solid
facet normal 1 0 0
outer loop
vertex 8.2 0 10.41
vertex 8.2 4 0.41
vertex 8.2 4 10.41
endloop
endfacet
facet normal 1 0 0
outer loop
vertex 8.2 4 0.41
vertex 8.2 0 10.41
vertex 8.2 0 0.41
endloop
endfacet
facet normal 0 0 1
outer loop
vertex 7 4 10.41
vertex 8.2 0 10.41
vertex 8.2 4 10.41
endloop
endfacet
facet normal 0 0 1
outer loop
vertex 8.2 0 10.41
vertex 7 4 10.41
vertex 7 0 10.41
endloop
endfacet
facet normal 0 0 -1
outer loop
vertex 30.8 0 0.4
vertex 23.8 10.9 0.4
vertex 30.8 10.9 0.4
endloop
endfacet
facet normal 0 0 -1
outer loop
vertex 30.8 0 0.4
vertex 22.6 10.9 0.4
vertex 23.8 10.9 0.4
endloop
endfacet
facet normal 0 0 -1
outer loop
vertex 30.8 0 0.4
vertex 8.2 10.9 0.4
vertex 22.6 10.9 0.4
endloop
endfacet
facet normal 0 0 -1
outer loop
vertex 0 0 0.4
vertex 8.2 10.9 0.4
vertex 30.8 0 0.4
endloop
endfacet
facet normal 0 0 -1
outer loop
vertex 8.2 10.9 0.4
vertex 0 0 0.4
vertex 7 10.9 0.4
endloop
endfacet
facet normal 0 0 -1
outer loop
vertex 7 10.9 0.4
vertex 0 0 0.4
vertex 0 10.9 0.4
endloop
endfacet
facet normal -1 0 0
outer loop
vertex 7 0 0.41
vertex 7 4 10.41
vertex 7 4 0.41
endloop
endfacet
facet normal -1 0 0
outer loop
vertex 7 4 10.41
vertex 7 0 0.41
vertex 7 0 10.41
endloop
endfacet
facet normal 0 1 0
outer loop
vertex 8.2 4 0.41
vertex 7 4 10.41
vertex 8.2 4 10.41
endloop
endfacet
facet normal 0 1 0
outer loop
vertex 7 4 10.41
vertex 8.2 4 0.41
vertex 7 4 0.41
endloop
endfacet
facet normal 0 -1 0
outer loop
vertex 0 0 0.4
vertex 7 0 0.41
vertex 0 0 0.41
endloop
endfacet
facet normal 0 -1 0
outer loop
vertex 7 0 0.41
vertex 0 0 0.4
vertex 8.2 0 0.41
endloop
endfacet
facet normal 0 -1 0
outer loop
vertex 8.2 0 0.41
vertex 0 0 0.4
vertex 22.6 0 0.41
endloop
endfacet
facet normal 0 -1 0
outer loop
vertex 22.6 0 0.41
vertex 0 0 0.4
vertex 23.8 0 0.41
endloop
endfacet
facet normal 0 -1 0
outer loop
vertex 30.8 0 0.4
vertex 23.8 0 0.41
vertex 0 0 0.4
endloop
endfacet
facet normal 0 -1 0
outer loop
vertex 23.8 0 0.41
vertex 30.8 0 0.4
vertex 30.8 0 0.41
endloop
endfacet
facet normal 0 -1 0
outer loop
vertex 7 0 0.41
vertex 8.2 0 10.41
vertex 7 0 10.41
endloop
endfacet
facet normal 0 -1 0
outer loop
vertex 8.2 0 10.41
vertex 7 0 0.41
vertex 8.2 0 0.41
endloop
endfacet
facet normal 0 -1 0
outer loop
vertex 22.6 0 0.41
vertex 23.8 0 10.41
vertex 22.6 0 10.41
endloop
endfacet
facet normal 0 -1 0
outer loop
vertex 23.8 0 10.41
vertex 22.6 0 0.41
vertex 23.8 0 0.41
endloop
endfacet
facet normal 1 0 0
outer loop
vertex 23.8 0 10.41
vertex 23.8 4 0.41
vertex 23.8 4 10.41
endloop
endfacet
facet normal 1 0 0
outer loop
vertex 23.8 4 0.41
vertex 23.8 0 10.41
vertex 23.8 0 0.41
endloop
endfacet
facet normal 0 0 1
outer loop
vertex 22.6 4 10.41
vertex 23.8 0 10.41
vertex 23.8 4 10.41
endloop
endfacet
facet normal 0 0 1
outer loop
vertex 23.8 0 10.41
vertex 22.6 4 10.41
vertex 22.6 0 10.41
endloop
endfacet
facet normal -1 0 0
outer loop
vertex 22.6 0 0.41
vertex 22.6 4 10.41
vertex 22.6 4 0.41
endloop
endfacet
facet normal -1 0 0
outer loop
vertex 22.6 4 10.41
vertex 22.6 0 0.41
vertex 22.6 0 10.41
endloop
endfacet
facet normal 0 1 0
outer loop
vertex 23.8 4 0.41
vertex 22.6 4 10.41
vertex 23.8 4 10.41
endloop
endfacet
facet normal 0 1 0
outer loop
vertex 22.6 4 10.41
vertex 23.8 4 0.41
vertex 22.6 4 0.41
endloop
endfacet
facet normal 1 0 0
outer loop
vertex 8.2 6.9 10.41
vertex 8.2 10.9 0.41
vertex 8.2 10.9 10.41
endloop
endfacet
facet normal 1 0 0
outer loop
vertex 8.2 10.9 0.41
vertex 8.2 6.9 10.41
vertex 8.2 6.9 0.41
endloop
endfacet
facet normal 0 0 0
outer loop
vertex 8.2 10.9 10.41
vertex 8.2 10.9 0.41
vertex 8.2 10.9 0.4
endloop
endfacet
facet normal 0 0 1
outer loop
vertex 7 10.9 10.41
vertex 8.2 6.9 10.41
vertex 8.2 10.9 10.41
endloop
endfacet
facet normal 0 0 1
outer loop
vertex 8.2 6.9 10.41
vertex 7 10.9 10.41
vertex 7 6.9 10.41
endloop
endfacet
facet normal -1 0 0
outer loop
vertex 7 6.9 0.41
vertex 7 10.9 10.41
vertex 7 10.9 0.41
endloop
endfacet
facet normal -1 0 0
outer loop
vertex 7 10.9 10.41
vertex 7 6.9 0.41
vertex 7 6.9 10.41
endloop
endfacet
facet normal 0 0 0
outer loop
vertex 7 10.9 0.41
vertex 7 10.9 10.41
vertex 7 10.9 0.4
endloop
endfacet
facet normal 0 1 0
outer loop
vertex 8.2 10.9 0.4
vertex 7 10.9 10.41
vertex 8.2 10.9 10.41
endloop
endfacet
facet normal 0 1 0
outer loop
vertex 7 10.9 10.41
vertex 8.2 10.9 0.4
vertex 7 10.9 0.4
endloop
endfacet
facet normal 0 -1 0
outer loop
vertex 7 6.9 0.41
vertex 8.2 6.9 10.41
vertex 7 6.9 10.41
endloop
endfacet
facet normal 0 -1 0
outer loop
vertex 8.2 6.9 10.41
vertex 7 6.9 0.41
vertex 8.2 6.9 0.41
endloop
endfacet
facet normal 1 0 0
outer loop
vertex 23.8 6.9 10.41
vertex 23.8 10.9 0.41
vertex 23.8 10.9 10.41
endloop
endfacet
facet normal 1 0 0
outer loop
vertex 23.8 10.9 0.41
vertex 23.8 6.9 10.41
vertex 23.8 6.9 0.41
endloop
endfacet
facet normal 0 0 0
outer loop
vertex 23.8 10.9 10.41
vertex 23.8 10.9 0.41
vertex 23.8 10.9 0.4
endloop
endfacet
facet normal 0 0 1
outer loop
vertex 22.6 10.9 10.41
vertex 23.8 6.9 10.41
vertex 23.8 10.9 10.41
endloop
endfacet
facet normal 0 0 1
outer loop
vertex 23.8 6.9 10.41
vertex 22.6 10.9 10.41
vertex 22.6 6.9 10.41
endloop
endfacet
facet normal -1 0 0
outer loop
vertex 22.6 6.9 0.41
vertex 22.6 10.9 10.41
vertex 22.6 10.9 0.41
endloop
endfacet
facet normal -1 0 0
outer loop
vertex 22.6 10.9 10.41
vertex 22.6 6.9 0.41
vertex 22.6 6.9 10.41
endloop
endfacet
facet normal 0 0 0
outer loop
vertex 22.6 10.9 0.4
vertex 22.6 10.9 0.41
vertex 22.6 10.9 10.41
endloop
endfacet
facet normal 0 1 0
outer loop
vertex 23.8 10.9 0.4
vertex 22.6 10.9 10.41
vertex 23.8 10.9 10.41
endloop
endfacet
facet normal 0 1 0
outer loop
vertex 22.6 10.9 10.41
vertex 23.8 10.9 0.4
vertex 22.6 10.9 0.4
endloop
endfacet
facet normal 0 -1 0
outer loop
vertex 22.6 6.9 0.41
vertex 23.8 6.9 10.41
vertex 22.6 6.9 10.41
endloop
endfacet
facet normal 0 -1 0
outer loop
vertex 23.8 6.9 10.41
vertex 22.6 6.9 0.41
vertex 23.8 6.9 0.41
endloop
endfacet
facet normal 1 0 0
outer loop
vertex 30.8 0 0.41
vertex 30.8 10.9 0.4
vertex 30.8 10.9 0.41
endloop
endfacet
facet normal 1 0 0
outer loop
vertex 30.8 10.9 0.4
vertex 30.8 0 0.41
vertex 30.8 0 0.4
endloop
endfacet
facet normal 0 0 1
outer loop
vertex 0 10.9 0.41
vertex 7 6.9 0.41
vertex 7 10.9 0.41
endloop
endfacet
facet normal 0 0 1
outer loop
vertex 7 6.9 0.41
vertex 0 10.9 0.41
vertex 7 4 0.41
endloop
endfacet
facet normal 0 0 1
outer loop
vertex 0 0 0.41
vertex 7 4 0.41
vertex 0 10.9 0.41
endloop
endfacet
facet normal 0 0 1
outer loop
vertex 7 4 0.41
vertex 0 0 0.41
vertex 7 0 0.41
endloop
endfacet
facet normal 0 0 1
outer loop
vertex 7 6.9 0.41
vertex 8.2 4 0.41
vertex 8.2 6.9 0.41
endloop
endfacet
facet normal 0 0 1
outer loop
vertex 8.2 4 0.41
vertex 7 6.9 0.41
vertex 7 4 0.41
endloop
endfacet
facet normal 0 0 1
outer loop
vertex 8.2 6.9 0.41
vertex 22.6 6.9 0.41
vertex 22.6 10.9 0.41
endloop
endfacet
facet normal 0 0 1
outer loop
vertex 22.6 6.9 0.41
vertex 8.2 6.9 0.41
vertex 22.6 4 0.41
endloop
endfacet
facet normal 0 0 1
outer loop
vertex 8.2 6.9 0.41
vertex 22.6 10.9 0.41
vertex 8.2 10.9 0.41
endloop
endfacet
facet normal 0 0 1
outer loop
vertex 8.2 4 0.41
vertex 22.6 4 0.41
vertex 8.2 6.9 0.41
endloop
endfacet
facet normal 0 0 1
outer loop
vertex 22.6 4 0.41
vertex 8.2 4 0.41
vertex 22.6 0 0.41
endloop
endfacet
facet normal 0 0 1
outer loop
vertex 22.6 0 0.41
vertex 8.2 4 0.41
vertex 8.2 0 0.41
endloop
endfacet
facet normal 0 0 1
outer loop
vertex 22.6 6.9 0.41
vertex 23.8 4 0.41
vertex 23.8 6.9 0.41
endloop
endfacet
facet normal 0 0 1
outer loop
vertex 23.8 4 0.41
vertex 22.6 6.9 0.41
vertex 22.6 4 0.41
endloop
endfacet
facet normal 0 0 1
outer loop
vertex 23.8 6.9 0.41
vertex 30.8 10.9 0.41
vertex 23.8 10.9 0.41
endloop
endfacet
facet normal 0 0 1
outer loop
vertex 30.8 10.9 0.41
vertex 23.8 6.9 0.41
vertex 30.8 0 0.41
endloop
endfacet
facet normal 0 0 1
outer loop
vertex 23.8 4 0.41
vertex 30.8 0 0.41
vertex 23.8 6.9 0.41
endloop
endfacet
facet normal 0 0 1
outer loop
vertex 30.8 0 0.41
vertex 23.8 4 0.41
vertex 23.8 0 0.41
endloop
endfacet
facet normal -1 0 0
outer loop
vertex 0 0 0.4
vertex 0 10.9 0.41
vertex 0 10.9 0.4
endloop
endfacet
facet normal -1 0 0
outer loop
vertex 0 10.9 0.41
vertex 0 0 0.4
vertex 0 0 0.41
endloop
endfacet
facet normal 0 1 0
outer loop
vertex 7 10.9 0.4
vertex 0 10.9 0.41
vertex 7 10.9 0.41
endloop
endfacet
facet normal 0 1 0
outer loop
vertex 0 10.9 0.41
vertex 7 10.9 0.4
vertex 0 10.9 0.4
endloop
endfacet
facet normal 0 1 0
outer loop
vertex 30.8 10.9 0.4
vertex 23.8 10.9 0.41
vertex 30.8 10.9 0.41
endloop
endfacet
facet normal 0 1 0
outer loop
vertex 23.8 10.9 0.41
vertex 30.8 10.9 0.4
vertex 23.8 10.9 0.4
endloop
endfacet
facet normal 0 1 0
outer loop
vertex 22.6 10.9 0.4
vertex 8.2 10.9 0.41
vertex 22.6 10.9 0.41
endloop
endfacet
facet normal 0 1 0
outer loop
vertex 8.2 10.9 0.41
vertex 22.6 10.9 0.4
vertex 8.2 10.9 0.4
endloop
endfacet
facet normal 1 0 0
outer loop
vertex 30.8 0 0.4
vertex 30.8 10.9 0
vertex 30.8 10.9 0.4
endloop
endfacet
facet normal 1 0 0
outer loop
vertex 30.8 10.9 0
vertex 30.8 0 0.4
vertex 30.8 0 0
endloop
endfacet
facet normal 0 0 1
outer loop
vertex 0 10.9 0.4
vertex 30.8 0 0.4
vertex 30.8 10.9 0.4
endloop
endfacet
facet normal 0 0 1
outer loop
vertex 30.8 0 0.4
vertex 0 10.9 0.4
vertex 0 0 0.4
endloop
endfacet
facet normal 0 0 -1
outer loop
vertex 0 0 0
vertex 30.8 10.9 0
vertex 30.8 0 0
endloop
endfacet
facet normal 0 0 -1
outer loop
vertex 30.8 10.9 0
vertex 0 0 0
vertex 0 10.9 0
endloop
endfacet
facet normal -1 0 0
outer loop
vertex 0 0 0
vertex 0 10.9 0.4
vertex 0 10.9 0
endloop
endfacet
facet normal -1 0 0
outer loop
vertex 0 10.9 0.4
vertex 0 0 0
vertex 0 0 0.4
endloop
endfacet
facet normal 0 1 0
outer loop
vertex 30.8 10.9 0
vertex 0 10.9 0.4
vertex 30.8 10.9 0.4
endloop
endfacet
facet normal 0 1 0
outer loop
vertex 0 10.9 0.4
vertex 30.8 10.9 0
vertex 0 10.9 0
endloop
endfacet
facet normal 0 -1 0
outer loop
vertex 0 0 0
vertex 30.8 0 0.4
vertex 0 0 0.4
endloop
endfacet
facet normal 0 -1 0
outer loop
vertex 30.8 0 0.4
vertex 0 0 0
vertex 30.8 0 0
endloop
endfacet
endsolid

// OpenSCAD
// file: ../../Base/Boxes.scad
// Fischertechnik Box Foundation
// Pre-designed Boxes

use <Constants.scad>

include <PlacementOptions.scad>

box190Width = 190;
box190Depth = 130;
box130Width = 130;
box130Depth = 95;
boxUsageHeight = 33.9;
boxWallThickness = 2.4;
boxBaseThickness = 1.0;
boxWebWidth = 3.0;

// getBoxWallThickness()
// Gets the wall thickness of a Fischertechnik Box

function getBoxWallThickness() = boxWallThickness;

// Gets the usable height of a fischertechnik box
function getBoxUsageHeight() = boxUsageHeight;

// Gets the thickness of the Fischertechnik box base.
function getBoxBaseThickness() = boxBaseThickness;

// Gets the width of a box web
function getBoxWebWidth() = boxWebWidth;

// Gets the usable inner space of a Box 190 as an x/y-list
function getBox190Space() = [
    box190Width - 2*getBoxWallThickness(), 
    box190Depth - 2*getBoxWallThickness() ];

// Imports the Fischertechnik empty box 130x190 mm and places it at position 0,0
// 190x130 are the outer sizes, the inner space is slightly smaller. Use getBox190Space() to get the inner sizes.
// This module needs the STL file "Fischertechnik Box 130x190.stl" in the library path.
// The box is positioned that the usable inner space is at the 0,0,0 position. The

module Box190() {
    translate([-getBoxWallThickness(),-getBoxWallThickness(),-getBoxBaseThickness()])
        import("Fischertechnik Box 130x190.stl", convexity=3);
}

// Gets the usable inner space of a Box 130 as an x/y-list
function getBox130Space() = [
    box130Width - 2*getBoxWallThickness(), 
    box130Depth - 2*getBoxWallThickness() ];

// Imports the Fischertechnik empty box 95x130 mm and places it at position 0,0
// 190x130 are the outer sizes, the inner space is slightly smaller. Use getBox190Space() to get the inner sizes.
// This module needs the STL file "Fischertechnik Box 95x130.stl" in the library path.
// The box is positioned that the usable inner space is at the 0,0,0 position. The

module Box130() {
    translate([-getBoxWallThickness(),-getBoxWallThickness(),-getBoxBaseThickness()])
        import("Fischertechnik Box 95x130.stl", convexity=3);
}

// Creates a web at the specified box walls
// corner 0 = LowerLeft, 1 = UpperLeft, 2 = UpperRight, 3 = LowerRight
// side 0 = LeftOfCorner, 1 = RightOfCorner
// distance = Distance in mm from the corner
// box = inner width and depth of the box (default: Box 190)
// webWidth = length of the web (default is 3 mms)
// webThickness = thickness of the web (default is 1 mm)

module BoxWeb(corner, side, distance, box=getBox190Space(), webWidth=getBoxWebWidth(), webThickness=1.0) {
    sink = getBoxWallThickness()/2;

    width = (corner % 2 == 0) ? 
            (side == LeftOfCorner ? webWidth : webThickness) :
            (side == LeftOfCorner ? webThickness : webWidth);

    depth = (corner % 2 == 0) ? 
            (side == RightOfCorner ? webWidth : webThickness) :
            (side == RightOfCorner ? webThickness : webWidth);
    
    xDiff = corner == LowerLeft ? 
                (side == LeftOfCorner ? -sink : distance) :
            (corner == UpperLeft ?                
                (side == LeftOfCorner ? distance : -sink) :
            (corner == UpperRight ?
                (side == LeftOfCorner ? box.x-webWidth+sink : box.x-distance-webThickness) :
                (side == LeftOfCorner ? box.x-distance-webThickness: box.x-webWidth+sink)));

    yDiff = corner == LowerLeft ? 
                (side == RightOfCorner ? -sink : distance) :
            (corner == UpperLeft ?
                (side == RightOfCorner ? box.y-distance : box.y-webWidth+sink) :
            (corner == UpperRight ?
                (side == RightOfCorner ? box.y-webWidth+sink : box.y-distance) :
                (side == RightOfCorner ? distance : -sink)));
    
    translate([xDiff, yDiff, -getExcess()])
        cube([width, depth, boxUsageHeight + 2*getExcess()]);
}
// file: ../../Base/Rotation.scad
// Fischertechnik Box Foundation
// Geometry Helpers Rotation

include <PlacementOptions.scad>

// getRotatedSpace(space, rotation=NoRotation)
// Rotates the space dependent on the specified rotation

function getRotatedSpace(space, rotation=NoRotation) = [
    (rotation == Rotate90 || rotation == Rotate270) ? space.y : space.x,
    (rotation == Rotate90 || rotation == Rotate270) ? space.x : space.y
];

// Rotates the given space around the fixed left lower corner
// space = the space the children needs as width/depth list [width,depth]
// rotation = 0 Rotate0 degrees, 1 Rotate90 degrees, 2 Rotate180 degrees, 3 Rotate270 degrees (equivalent to -90)

module RotateFix(space, rotation=Rotate0) {
    dy = (rotation == Rotate0 || rotation == Rotate270) ? 0 :
        (rotation == Rotate90) ? space.x :
        space.y;
    dx = (rotation < Rotate180) ? 0 :
        (rotation == Rotate180) ? space.x :
        space.y;
    
    translate([dx, dy, 0])
        rotate([0, 0, rotations[rotation]])
            children();
}
// file: ../../Base/Alignment.scad
// Fischertechnik Box Foundation
// Geometry Helpers Alignment

include <PlacementOptions.scad>

// getAlignedX(elementWidth, spaceWidth, align=AlignRight, offset=0)
// Gets the aligned X offset of an element with the given
// width in the given space.
// elementWidth = The width of the element to positon
// spaceWidth = The space where the element should be aligned
// align = 0 AlignLeft, 1 AlignCenter, 2 AlignRight
// offset = an optional offset from the aligned position. When
// aligned left or centered, then positive values are in X direction.
// When aligned right then positive values are in negative X direction.

function getAlignedX(elementWidth, spaceWidth, align=AlignRight, offset=0) =
    (align == AlignLeft) ?
        offset :
        ((align == AlignCenter) ?
        (spaceWidth - elementWidth)/2 + offset :
        spaceWidth - offset - elementWidth);

// getAlignedY(elementDepth, spaceDepth, align=AlignTop, offset=0)
// Gets the aligned Y offset of an element with the given
// depth in the given space.
// elementDepth = The depth of the element to positon
// spaceDepth = The space where the element should be aligned
// align = 0 AlignBottom, 1 AlignCenter, 2 AlignTop
// offset = an optional offset from the aligned position. When
// aligned bottom or centered, then positive values are in Y direction.
// When aligned top then positive values are in negative Y direction.

function getAlignedY(elementDepth, spaceDepth, align=AlignTop, offset=0) =
    (align == AlignBottom) ?
        offset :
        ((align == AlignCenter) ?
        (spaceDepth - elementDepth)/2 + offset :
        spaceDepth - offset - elementDepth);
// file: ../../Base/PlacementOptions.scad
// Fischertechnik Box Foundation
// Placement Options

// Alignment
NoAlign = 0;
AlignLeft = 1;
AlignBottom = 2;
AlignCenter = 3;
AlignRight = 4;
AlignTop = 5;

// Element rotation degree steps
rotations = [0, -90, -180, -270];

// Rotation
NoRotation = 0;
Rotate0 = 0;
Rotate90 = 1;
Rotate180 = 2;
Rotate270 = 3;

// Docking (seen from above)
NoDock = -1;
DockLeft = 0;
DockTop = 1;
DockRight = 2;
DockCorner = 2;
DockBottom = 3;

// Web corners
LowerLeft = 0;
UpperLeft = 1;
UpperRight = 2;
LowerRight = 3;

// Web position relative to corner
LeftOfCorner = 0;
RightOfCorner = 1;
// file: ../../Base/Placement.scad
// Fischertechnik Box Foundation
// Geometry Helpers Placement

use <Constants.scad>
use <Alignment.scad>
use <Rotation.scad>
use <Boxes.scad>

include <PlacementOptions.scad>

// Place(x=0, y=0, elementSpace=[0,0], alignX=AlignLeft, alignY=AlignBottom, rotation=Rotate0, boxSpace=getBox190Space())
// Places the child at the specified position
// y = Y-Position. This is a relative position when an X aligment is specified.
// x = X-Position. This is a relative position when an Y aligment is specified.
// elementSpace = space of the element to be placed [x,y]
// alignX = -1=NoAlign, 0 AlignLeft, 1 AlignCenter, 3 AlignRight (elementSpace and boxSpace required!)
// alignY = -1=NoAlign, 2 AlignBottom, 1 AlignCenter, 4 AlignTop (elementSpace and boxSpace required!)
// rotation = 0 Rotate0 0 degrees, 1 Rotate90 90 degrees, 
// 2 Rotate180 180 degrees, 3 Rotate270 270 degrees (equivalent to -90)
// boxSpace = Inner space of the box where the placement occurs [x,y] - default is Box 190x130 inner space

module Place(x=0, y=0, elementSpace=[0,0], 
  alignX=AlignLeft, alignY=AlignBottom, 
  rotation=NoRotation, boxSpace=getBox190Space()) {

    module Position(x, y, space, rotation=Rotate0) {
        translate([x, y, 0])
            RotateFix(space, rotation)
                children();
    }

    space = getRotatedSpace(elementSpace, rotation);
    alignedX = getAlignedX(space.x, boxSpace.x, alignX, x);
    alignedY = getAlignedY(space.y, boxSpace.y, alignY, y);
    Position(alignedX, alignedY, elementSpace, rotation)
        children();
}

// Center(space=getBox130Space(), elementSpace=[0,0])
// space = Space where the children is centered. For cylinder use centered=true and no elementSpace.
// elementSpace = space of the element to be centered [x,y]

module Center(space=getBox190Space(), elementSpace=[0,0]) {
    translate([(space.x - elementSpace.x) / 2, (space.y - elementSpace.y) / 2])
        children(0);
}

// CenterHorizontal(width=0, y=0, offset=0, space=getBox130Space())
// space = Space where the children is centered. For cylinder use centered=true and no elementSpace.
// elementSpace = space of the element to be centered [x,y]

module CenterHorizontal(width=0, y=0, offset=0, space=getBox190Space()) {
    translate([(space.x - width) / 2 + offset, y])
        children(0);
}

// CenterVertical(depth=0, x=0, offset=0, space=getBox130Space())
// space = Space where the children is centered. For cylinder use centered=true and no elementSpace.
// elementSpace = space of the element to be centered [x,y]

module CenterVertical(depth=0, x=0, offset=0, space=getBox190Space()) {
    translate([x, (space.y - depth) / 2 + offset])
        children(0);
}
// file: ../../Elements/AxisClip10.scad
// Fischertechnik Box Library
// Axis for clip 10
// 31023

use <../ModelBase/Simple.scad>

width = 12;
depth = 12;
height = 23;

// getAxisClip10Space()
// Gets the space of a frame for a clip 10 with spring ring (mot2)

function getAxisClip10Space() = [width, depth, height];

// AxisClip10()
// Axis for clip 10 with spring ring (mot2)

module AxisClip10() {
    LeveledAxisWithSpace(height, height-10, getAxisClip10Space());
}

// Tests
color("lightgray")
AxisClip10();
// file: ../../Base/Constants.scad
// Fischertechnik Box Foundation
// Constants

// Constant values necessary for multiple elements

// Base constants
dividerThickness = 1.2;
excess = 0.01;
fragments = 90;
tolerance = 0.8;

// Gets the thickness of a divider 
function getDividerThickness() = dividerThickness;

// Gets the excess that is used to merge walls into each other
function getExcess() = excess;

// Gets amount of fragments of a cylinder
function getFragments() = fragments;

// Gets the inner tolerance of a frame to each side
function getTolerance() = tolerance;


// Fischertechnik specific constants
axisDiameter = 4;
axisBottomDiameter = axisDiameter + 1;
standardEdgeDistance = 2.5;
standardWebDistance = 11.5;
standardCornerLength = 15;
tubeWallFactor = 0.8;

// Gets axis diameter
function getAxisDiameter() = axisDiameter;

// Gets axis bottom diameter for thicker part at the bottom
function getAxisBottomDiameter() = axisBottomDiameter;

// gets the standard distance to the wall of the box for dockable frames with webs
function getStandardEdgeDistance() = standardEdgeDistance;

// gets the standard distance of each web to the corner of the dockable frame
function getStandardWebDistance() = standardWebDistance;

// gets the standard length of the corner walls of a dockable frame
function getStandardCornerLength() = standardCornerLength;

// gets the wall thickness of a tube.
function getTubeWallThickness() = tubeWallFactor * getDividerThickness();
// file: ../../Elements/HolderBuildingPlate30x30.scad
// Fischertechnik Box Library
// Holder for Building Plate 30x30
// 38259

use <../ModelBase/Complex.scad>

width = 30;

// getHolderBuildingPlate30x30Space(count = 1)
// Gets the width (.x) and depth (.y) space the holder needs.

function getHolderBuildingPlate30x30Space(count = 1) = getHolderBuildingPlateSpace(width, count);

// HolderBuildingPlate30x30(count=1, dock=false)
// Holder for building plates 30x30
// count = Count of building plates (default 1)
// dock = true if the holders are docked to the box wall (default false) 

module HolderBuildingPlate30x30(count = 1, dock = false) {
    HolderBuildingPlate(width, count, firstGapHigher = dock);
}

// Test
color("lightgray")
HolderBuildingPlate30x30();
// file: ../TestPrint.scad
// 3D Print Test Base

use <../Base/Constants.scad>

use <../Elements/AxisClip10.scad>

module TestPrint(elementSpace) {
    cube([elementSpace.x, elementSpace.y, 0.4]);
    translate([0,0,0.4+getExcess()]) {
        children();
    }
}

TestPrint(getAxisClip10Space())
    AxisClip10();
// main file
// 3D Print Test Base
// HolderBuildingPlate30x30

use <../TestPrint.scad>
use <../../Elements/HolderBuildingPlate30x30.scad>

TestPrint(getHolderBuildingPlate30x30Space())
    HolderBuildingPlate30x30();
